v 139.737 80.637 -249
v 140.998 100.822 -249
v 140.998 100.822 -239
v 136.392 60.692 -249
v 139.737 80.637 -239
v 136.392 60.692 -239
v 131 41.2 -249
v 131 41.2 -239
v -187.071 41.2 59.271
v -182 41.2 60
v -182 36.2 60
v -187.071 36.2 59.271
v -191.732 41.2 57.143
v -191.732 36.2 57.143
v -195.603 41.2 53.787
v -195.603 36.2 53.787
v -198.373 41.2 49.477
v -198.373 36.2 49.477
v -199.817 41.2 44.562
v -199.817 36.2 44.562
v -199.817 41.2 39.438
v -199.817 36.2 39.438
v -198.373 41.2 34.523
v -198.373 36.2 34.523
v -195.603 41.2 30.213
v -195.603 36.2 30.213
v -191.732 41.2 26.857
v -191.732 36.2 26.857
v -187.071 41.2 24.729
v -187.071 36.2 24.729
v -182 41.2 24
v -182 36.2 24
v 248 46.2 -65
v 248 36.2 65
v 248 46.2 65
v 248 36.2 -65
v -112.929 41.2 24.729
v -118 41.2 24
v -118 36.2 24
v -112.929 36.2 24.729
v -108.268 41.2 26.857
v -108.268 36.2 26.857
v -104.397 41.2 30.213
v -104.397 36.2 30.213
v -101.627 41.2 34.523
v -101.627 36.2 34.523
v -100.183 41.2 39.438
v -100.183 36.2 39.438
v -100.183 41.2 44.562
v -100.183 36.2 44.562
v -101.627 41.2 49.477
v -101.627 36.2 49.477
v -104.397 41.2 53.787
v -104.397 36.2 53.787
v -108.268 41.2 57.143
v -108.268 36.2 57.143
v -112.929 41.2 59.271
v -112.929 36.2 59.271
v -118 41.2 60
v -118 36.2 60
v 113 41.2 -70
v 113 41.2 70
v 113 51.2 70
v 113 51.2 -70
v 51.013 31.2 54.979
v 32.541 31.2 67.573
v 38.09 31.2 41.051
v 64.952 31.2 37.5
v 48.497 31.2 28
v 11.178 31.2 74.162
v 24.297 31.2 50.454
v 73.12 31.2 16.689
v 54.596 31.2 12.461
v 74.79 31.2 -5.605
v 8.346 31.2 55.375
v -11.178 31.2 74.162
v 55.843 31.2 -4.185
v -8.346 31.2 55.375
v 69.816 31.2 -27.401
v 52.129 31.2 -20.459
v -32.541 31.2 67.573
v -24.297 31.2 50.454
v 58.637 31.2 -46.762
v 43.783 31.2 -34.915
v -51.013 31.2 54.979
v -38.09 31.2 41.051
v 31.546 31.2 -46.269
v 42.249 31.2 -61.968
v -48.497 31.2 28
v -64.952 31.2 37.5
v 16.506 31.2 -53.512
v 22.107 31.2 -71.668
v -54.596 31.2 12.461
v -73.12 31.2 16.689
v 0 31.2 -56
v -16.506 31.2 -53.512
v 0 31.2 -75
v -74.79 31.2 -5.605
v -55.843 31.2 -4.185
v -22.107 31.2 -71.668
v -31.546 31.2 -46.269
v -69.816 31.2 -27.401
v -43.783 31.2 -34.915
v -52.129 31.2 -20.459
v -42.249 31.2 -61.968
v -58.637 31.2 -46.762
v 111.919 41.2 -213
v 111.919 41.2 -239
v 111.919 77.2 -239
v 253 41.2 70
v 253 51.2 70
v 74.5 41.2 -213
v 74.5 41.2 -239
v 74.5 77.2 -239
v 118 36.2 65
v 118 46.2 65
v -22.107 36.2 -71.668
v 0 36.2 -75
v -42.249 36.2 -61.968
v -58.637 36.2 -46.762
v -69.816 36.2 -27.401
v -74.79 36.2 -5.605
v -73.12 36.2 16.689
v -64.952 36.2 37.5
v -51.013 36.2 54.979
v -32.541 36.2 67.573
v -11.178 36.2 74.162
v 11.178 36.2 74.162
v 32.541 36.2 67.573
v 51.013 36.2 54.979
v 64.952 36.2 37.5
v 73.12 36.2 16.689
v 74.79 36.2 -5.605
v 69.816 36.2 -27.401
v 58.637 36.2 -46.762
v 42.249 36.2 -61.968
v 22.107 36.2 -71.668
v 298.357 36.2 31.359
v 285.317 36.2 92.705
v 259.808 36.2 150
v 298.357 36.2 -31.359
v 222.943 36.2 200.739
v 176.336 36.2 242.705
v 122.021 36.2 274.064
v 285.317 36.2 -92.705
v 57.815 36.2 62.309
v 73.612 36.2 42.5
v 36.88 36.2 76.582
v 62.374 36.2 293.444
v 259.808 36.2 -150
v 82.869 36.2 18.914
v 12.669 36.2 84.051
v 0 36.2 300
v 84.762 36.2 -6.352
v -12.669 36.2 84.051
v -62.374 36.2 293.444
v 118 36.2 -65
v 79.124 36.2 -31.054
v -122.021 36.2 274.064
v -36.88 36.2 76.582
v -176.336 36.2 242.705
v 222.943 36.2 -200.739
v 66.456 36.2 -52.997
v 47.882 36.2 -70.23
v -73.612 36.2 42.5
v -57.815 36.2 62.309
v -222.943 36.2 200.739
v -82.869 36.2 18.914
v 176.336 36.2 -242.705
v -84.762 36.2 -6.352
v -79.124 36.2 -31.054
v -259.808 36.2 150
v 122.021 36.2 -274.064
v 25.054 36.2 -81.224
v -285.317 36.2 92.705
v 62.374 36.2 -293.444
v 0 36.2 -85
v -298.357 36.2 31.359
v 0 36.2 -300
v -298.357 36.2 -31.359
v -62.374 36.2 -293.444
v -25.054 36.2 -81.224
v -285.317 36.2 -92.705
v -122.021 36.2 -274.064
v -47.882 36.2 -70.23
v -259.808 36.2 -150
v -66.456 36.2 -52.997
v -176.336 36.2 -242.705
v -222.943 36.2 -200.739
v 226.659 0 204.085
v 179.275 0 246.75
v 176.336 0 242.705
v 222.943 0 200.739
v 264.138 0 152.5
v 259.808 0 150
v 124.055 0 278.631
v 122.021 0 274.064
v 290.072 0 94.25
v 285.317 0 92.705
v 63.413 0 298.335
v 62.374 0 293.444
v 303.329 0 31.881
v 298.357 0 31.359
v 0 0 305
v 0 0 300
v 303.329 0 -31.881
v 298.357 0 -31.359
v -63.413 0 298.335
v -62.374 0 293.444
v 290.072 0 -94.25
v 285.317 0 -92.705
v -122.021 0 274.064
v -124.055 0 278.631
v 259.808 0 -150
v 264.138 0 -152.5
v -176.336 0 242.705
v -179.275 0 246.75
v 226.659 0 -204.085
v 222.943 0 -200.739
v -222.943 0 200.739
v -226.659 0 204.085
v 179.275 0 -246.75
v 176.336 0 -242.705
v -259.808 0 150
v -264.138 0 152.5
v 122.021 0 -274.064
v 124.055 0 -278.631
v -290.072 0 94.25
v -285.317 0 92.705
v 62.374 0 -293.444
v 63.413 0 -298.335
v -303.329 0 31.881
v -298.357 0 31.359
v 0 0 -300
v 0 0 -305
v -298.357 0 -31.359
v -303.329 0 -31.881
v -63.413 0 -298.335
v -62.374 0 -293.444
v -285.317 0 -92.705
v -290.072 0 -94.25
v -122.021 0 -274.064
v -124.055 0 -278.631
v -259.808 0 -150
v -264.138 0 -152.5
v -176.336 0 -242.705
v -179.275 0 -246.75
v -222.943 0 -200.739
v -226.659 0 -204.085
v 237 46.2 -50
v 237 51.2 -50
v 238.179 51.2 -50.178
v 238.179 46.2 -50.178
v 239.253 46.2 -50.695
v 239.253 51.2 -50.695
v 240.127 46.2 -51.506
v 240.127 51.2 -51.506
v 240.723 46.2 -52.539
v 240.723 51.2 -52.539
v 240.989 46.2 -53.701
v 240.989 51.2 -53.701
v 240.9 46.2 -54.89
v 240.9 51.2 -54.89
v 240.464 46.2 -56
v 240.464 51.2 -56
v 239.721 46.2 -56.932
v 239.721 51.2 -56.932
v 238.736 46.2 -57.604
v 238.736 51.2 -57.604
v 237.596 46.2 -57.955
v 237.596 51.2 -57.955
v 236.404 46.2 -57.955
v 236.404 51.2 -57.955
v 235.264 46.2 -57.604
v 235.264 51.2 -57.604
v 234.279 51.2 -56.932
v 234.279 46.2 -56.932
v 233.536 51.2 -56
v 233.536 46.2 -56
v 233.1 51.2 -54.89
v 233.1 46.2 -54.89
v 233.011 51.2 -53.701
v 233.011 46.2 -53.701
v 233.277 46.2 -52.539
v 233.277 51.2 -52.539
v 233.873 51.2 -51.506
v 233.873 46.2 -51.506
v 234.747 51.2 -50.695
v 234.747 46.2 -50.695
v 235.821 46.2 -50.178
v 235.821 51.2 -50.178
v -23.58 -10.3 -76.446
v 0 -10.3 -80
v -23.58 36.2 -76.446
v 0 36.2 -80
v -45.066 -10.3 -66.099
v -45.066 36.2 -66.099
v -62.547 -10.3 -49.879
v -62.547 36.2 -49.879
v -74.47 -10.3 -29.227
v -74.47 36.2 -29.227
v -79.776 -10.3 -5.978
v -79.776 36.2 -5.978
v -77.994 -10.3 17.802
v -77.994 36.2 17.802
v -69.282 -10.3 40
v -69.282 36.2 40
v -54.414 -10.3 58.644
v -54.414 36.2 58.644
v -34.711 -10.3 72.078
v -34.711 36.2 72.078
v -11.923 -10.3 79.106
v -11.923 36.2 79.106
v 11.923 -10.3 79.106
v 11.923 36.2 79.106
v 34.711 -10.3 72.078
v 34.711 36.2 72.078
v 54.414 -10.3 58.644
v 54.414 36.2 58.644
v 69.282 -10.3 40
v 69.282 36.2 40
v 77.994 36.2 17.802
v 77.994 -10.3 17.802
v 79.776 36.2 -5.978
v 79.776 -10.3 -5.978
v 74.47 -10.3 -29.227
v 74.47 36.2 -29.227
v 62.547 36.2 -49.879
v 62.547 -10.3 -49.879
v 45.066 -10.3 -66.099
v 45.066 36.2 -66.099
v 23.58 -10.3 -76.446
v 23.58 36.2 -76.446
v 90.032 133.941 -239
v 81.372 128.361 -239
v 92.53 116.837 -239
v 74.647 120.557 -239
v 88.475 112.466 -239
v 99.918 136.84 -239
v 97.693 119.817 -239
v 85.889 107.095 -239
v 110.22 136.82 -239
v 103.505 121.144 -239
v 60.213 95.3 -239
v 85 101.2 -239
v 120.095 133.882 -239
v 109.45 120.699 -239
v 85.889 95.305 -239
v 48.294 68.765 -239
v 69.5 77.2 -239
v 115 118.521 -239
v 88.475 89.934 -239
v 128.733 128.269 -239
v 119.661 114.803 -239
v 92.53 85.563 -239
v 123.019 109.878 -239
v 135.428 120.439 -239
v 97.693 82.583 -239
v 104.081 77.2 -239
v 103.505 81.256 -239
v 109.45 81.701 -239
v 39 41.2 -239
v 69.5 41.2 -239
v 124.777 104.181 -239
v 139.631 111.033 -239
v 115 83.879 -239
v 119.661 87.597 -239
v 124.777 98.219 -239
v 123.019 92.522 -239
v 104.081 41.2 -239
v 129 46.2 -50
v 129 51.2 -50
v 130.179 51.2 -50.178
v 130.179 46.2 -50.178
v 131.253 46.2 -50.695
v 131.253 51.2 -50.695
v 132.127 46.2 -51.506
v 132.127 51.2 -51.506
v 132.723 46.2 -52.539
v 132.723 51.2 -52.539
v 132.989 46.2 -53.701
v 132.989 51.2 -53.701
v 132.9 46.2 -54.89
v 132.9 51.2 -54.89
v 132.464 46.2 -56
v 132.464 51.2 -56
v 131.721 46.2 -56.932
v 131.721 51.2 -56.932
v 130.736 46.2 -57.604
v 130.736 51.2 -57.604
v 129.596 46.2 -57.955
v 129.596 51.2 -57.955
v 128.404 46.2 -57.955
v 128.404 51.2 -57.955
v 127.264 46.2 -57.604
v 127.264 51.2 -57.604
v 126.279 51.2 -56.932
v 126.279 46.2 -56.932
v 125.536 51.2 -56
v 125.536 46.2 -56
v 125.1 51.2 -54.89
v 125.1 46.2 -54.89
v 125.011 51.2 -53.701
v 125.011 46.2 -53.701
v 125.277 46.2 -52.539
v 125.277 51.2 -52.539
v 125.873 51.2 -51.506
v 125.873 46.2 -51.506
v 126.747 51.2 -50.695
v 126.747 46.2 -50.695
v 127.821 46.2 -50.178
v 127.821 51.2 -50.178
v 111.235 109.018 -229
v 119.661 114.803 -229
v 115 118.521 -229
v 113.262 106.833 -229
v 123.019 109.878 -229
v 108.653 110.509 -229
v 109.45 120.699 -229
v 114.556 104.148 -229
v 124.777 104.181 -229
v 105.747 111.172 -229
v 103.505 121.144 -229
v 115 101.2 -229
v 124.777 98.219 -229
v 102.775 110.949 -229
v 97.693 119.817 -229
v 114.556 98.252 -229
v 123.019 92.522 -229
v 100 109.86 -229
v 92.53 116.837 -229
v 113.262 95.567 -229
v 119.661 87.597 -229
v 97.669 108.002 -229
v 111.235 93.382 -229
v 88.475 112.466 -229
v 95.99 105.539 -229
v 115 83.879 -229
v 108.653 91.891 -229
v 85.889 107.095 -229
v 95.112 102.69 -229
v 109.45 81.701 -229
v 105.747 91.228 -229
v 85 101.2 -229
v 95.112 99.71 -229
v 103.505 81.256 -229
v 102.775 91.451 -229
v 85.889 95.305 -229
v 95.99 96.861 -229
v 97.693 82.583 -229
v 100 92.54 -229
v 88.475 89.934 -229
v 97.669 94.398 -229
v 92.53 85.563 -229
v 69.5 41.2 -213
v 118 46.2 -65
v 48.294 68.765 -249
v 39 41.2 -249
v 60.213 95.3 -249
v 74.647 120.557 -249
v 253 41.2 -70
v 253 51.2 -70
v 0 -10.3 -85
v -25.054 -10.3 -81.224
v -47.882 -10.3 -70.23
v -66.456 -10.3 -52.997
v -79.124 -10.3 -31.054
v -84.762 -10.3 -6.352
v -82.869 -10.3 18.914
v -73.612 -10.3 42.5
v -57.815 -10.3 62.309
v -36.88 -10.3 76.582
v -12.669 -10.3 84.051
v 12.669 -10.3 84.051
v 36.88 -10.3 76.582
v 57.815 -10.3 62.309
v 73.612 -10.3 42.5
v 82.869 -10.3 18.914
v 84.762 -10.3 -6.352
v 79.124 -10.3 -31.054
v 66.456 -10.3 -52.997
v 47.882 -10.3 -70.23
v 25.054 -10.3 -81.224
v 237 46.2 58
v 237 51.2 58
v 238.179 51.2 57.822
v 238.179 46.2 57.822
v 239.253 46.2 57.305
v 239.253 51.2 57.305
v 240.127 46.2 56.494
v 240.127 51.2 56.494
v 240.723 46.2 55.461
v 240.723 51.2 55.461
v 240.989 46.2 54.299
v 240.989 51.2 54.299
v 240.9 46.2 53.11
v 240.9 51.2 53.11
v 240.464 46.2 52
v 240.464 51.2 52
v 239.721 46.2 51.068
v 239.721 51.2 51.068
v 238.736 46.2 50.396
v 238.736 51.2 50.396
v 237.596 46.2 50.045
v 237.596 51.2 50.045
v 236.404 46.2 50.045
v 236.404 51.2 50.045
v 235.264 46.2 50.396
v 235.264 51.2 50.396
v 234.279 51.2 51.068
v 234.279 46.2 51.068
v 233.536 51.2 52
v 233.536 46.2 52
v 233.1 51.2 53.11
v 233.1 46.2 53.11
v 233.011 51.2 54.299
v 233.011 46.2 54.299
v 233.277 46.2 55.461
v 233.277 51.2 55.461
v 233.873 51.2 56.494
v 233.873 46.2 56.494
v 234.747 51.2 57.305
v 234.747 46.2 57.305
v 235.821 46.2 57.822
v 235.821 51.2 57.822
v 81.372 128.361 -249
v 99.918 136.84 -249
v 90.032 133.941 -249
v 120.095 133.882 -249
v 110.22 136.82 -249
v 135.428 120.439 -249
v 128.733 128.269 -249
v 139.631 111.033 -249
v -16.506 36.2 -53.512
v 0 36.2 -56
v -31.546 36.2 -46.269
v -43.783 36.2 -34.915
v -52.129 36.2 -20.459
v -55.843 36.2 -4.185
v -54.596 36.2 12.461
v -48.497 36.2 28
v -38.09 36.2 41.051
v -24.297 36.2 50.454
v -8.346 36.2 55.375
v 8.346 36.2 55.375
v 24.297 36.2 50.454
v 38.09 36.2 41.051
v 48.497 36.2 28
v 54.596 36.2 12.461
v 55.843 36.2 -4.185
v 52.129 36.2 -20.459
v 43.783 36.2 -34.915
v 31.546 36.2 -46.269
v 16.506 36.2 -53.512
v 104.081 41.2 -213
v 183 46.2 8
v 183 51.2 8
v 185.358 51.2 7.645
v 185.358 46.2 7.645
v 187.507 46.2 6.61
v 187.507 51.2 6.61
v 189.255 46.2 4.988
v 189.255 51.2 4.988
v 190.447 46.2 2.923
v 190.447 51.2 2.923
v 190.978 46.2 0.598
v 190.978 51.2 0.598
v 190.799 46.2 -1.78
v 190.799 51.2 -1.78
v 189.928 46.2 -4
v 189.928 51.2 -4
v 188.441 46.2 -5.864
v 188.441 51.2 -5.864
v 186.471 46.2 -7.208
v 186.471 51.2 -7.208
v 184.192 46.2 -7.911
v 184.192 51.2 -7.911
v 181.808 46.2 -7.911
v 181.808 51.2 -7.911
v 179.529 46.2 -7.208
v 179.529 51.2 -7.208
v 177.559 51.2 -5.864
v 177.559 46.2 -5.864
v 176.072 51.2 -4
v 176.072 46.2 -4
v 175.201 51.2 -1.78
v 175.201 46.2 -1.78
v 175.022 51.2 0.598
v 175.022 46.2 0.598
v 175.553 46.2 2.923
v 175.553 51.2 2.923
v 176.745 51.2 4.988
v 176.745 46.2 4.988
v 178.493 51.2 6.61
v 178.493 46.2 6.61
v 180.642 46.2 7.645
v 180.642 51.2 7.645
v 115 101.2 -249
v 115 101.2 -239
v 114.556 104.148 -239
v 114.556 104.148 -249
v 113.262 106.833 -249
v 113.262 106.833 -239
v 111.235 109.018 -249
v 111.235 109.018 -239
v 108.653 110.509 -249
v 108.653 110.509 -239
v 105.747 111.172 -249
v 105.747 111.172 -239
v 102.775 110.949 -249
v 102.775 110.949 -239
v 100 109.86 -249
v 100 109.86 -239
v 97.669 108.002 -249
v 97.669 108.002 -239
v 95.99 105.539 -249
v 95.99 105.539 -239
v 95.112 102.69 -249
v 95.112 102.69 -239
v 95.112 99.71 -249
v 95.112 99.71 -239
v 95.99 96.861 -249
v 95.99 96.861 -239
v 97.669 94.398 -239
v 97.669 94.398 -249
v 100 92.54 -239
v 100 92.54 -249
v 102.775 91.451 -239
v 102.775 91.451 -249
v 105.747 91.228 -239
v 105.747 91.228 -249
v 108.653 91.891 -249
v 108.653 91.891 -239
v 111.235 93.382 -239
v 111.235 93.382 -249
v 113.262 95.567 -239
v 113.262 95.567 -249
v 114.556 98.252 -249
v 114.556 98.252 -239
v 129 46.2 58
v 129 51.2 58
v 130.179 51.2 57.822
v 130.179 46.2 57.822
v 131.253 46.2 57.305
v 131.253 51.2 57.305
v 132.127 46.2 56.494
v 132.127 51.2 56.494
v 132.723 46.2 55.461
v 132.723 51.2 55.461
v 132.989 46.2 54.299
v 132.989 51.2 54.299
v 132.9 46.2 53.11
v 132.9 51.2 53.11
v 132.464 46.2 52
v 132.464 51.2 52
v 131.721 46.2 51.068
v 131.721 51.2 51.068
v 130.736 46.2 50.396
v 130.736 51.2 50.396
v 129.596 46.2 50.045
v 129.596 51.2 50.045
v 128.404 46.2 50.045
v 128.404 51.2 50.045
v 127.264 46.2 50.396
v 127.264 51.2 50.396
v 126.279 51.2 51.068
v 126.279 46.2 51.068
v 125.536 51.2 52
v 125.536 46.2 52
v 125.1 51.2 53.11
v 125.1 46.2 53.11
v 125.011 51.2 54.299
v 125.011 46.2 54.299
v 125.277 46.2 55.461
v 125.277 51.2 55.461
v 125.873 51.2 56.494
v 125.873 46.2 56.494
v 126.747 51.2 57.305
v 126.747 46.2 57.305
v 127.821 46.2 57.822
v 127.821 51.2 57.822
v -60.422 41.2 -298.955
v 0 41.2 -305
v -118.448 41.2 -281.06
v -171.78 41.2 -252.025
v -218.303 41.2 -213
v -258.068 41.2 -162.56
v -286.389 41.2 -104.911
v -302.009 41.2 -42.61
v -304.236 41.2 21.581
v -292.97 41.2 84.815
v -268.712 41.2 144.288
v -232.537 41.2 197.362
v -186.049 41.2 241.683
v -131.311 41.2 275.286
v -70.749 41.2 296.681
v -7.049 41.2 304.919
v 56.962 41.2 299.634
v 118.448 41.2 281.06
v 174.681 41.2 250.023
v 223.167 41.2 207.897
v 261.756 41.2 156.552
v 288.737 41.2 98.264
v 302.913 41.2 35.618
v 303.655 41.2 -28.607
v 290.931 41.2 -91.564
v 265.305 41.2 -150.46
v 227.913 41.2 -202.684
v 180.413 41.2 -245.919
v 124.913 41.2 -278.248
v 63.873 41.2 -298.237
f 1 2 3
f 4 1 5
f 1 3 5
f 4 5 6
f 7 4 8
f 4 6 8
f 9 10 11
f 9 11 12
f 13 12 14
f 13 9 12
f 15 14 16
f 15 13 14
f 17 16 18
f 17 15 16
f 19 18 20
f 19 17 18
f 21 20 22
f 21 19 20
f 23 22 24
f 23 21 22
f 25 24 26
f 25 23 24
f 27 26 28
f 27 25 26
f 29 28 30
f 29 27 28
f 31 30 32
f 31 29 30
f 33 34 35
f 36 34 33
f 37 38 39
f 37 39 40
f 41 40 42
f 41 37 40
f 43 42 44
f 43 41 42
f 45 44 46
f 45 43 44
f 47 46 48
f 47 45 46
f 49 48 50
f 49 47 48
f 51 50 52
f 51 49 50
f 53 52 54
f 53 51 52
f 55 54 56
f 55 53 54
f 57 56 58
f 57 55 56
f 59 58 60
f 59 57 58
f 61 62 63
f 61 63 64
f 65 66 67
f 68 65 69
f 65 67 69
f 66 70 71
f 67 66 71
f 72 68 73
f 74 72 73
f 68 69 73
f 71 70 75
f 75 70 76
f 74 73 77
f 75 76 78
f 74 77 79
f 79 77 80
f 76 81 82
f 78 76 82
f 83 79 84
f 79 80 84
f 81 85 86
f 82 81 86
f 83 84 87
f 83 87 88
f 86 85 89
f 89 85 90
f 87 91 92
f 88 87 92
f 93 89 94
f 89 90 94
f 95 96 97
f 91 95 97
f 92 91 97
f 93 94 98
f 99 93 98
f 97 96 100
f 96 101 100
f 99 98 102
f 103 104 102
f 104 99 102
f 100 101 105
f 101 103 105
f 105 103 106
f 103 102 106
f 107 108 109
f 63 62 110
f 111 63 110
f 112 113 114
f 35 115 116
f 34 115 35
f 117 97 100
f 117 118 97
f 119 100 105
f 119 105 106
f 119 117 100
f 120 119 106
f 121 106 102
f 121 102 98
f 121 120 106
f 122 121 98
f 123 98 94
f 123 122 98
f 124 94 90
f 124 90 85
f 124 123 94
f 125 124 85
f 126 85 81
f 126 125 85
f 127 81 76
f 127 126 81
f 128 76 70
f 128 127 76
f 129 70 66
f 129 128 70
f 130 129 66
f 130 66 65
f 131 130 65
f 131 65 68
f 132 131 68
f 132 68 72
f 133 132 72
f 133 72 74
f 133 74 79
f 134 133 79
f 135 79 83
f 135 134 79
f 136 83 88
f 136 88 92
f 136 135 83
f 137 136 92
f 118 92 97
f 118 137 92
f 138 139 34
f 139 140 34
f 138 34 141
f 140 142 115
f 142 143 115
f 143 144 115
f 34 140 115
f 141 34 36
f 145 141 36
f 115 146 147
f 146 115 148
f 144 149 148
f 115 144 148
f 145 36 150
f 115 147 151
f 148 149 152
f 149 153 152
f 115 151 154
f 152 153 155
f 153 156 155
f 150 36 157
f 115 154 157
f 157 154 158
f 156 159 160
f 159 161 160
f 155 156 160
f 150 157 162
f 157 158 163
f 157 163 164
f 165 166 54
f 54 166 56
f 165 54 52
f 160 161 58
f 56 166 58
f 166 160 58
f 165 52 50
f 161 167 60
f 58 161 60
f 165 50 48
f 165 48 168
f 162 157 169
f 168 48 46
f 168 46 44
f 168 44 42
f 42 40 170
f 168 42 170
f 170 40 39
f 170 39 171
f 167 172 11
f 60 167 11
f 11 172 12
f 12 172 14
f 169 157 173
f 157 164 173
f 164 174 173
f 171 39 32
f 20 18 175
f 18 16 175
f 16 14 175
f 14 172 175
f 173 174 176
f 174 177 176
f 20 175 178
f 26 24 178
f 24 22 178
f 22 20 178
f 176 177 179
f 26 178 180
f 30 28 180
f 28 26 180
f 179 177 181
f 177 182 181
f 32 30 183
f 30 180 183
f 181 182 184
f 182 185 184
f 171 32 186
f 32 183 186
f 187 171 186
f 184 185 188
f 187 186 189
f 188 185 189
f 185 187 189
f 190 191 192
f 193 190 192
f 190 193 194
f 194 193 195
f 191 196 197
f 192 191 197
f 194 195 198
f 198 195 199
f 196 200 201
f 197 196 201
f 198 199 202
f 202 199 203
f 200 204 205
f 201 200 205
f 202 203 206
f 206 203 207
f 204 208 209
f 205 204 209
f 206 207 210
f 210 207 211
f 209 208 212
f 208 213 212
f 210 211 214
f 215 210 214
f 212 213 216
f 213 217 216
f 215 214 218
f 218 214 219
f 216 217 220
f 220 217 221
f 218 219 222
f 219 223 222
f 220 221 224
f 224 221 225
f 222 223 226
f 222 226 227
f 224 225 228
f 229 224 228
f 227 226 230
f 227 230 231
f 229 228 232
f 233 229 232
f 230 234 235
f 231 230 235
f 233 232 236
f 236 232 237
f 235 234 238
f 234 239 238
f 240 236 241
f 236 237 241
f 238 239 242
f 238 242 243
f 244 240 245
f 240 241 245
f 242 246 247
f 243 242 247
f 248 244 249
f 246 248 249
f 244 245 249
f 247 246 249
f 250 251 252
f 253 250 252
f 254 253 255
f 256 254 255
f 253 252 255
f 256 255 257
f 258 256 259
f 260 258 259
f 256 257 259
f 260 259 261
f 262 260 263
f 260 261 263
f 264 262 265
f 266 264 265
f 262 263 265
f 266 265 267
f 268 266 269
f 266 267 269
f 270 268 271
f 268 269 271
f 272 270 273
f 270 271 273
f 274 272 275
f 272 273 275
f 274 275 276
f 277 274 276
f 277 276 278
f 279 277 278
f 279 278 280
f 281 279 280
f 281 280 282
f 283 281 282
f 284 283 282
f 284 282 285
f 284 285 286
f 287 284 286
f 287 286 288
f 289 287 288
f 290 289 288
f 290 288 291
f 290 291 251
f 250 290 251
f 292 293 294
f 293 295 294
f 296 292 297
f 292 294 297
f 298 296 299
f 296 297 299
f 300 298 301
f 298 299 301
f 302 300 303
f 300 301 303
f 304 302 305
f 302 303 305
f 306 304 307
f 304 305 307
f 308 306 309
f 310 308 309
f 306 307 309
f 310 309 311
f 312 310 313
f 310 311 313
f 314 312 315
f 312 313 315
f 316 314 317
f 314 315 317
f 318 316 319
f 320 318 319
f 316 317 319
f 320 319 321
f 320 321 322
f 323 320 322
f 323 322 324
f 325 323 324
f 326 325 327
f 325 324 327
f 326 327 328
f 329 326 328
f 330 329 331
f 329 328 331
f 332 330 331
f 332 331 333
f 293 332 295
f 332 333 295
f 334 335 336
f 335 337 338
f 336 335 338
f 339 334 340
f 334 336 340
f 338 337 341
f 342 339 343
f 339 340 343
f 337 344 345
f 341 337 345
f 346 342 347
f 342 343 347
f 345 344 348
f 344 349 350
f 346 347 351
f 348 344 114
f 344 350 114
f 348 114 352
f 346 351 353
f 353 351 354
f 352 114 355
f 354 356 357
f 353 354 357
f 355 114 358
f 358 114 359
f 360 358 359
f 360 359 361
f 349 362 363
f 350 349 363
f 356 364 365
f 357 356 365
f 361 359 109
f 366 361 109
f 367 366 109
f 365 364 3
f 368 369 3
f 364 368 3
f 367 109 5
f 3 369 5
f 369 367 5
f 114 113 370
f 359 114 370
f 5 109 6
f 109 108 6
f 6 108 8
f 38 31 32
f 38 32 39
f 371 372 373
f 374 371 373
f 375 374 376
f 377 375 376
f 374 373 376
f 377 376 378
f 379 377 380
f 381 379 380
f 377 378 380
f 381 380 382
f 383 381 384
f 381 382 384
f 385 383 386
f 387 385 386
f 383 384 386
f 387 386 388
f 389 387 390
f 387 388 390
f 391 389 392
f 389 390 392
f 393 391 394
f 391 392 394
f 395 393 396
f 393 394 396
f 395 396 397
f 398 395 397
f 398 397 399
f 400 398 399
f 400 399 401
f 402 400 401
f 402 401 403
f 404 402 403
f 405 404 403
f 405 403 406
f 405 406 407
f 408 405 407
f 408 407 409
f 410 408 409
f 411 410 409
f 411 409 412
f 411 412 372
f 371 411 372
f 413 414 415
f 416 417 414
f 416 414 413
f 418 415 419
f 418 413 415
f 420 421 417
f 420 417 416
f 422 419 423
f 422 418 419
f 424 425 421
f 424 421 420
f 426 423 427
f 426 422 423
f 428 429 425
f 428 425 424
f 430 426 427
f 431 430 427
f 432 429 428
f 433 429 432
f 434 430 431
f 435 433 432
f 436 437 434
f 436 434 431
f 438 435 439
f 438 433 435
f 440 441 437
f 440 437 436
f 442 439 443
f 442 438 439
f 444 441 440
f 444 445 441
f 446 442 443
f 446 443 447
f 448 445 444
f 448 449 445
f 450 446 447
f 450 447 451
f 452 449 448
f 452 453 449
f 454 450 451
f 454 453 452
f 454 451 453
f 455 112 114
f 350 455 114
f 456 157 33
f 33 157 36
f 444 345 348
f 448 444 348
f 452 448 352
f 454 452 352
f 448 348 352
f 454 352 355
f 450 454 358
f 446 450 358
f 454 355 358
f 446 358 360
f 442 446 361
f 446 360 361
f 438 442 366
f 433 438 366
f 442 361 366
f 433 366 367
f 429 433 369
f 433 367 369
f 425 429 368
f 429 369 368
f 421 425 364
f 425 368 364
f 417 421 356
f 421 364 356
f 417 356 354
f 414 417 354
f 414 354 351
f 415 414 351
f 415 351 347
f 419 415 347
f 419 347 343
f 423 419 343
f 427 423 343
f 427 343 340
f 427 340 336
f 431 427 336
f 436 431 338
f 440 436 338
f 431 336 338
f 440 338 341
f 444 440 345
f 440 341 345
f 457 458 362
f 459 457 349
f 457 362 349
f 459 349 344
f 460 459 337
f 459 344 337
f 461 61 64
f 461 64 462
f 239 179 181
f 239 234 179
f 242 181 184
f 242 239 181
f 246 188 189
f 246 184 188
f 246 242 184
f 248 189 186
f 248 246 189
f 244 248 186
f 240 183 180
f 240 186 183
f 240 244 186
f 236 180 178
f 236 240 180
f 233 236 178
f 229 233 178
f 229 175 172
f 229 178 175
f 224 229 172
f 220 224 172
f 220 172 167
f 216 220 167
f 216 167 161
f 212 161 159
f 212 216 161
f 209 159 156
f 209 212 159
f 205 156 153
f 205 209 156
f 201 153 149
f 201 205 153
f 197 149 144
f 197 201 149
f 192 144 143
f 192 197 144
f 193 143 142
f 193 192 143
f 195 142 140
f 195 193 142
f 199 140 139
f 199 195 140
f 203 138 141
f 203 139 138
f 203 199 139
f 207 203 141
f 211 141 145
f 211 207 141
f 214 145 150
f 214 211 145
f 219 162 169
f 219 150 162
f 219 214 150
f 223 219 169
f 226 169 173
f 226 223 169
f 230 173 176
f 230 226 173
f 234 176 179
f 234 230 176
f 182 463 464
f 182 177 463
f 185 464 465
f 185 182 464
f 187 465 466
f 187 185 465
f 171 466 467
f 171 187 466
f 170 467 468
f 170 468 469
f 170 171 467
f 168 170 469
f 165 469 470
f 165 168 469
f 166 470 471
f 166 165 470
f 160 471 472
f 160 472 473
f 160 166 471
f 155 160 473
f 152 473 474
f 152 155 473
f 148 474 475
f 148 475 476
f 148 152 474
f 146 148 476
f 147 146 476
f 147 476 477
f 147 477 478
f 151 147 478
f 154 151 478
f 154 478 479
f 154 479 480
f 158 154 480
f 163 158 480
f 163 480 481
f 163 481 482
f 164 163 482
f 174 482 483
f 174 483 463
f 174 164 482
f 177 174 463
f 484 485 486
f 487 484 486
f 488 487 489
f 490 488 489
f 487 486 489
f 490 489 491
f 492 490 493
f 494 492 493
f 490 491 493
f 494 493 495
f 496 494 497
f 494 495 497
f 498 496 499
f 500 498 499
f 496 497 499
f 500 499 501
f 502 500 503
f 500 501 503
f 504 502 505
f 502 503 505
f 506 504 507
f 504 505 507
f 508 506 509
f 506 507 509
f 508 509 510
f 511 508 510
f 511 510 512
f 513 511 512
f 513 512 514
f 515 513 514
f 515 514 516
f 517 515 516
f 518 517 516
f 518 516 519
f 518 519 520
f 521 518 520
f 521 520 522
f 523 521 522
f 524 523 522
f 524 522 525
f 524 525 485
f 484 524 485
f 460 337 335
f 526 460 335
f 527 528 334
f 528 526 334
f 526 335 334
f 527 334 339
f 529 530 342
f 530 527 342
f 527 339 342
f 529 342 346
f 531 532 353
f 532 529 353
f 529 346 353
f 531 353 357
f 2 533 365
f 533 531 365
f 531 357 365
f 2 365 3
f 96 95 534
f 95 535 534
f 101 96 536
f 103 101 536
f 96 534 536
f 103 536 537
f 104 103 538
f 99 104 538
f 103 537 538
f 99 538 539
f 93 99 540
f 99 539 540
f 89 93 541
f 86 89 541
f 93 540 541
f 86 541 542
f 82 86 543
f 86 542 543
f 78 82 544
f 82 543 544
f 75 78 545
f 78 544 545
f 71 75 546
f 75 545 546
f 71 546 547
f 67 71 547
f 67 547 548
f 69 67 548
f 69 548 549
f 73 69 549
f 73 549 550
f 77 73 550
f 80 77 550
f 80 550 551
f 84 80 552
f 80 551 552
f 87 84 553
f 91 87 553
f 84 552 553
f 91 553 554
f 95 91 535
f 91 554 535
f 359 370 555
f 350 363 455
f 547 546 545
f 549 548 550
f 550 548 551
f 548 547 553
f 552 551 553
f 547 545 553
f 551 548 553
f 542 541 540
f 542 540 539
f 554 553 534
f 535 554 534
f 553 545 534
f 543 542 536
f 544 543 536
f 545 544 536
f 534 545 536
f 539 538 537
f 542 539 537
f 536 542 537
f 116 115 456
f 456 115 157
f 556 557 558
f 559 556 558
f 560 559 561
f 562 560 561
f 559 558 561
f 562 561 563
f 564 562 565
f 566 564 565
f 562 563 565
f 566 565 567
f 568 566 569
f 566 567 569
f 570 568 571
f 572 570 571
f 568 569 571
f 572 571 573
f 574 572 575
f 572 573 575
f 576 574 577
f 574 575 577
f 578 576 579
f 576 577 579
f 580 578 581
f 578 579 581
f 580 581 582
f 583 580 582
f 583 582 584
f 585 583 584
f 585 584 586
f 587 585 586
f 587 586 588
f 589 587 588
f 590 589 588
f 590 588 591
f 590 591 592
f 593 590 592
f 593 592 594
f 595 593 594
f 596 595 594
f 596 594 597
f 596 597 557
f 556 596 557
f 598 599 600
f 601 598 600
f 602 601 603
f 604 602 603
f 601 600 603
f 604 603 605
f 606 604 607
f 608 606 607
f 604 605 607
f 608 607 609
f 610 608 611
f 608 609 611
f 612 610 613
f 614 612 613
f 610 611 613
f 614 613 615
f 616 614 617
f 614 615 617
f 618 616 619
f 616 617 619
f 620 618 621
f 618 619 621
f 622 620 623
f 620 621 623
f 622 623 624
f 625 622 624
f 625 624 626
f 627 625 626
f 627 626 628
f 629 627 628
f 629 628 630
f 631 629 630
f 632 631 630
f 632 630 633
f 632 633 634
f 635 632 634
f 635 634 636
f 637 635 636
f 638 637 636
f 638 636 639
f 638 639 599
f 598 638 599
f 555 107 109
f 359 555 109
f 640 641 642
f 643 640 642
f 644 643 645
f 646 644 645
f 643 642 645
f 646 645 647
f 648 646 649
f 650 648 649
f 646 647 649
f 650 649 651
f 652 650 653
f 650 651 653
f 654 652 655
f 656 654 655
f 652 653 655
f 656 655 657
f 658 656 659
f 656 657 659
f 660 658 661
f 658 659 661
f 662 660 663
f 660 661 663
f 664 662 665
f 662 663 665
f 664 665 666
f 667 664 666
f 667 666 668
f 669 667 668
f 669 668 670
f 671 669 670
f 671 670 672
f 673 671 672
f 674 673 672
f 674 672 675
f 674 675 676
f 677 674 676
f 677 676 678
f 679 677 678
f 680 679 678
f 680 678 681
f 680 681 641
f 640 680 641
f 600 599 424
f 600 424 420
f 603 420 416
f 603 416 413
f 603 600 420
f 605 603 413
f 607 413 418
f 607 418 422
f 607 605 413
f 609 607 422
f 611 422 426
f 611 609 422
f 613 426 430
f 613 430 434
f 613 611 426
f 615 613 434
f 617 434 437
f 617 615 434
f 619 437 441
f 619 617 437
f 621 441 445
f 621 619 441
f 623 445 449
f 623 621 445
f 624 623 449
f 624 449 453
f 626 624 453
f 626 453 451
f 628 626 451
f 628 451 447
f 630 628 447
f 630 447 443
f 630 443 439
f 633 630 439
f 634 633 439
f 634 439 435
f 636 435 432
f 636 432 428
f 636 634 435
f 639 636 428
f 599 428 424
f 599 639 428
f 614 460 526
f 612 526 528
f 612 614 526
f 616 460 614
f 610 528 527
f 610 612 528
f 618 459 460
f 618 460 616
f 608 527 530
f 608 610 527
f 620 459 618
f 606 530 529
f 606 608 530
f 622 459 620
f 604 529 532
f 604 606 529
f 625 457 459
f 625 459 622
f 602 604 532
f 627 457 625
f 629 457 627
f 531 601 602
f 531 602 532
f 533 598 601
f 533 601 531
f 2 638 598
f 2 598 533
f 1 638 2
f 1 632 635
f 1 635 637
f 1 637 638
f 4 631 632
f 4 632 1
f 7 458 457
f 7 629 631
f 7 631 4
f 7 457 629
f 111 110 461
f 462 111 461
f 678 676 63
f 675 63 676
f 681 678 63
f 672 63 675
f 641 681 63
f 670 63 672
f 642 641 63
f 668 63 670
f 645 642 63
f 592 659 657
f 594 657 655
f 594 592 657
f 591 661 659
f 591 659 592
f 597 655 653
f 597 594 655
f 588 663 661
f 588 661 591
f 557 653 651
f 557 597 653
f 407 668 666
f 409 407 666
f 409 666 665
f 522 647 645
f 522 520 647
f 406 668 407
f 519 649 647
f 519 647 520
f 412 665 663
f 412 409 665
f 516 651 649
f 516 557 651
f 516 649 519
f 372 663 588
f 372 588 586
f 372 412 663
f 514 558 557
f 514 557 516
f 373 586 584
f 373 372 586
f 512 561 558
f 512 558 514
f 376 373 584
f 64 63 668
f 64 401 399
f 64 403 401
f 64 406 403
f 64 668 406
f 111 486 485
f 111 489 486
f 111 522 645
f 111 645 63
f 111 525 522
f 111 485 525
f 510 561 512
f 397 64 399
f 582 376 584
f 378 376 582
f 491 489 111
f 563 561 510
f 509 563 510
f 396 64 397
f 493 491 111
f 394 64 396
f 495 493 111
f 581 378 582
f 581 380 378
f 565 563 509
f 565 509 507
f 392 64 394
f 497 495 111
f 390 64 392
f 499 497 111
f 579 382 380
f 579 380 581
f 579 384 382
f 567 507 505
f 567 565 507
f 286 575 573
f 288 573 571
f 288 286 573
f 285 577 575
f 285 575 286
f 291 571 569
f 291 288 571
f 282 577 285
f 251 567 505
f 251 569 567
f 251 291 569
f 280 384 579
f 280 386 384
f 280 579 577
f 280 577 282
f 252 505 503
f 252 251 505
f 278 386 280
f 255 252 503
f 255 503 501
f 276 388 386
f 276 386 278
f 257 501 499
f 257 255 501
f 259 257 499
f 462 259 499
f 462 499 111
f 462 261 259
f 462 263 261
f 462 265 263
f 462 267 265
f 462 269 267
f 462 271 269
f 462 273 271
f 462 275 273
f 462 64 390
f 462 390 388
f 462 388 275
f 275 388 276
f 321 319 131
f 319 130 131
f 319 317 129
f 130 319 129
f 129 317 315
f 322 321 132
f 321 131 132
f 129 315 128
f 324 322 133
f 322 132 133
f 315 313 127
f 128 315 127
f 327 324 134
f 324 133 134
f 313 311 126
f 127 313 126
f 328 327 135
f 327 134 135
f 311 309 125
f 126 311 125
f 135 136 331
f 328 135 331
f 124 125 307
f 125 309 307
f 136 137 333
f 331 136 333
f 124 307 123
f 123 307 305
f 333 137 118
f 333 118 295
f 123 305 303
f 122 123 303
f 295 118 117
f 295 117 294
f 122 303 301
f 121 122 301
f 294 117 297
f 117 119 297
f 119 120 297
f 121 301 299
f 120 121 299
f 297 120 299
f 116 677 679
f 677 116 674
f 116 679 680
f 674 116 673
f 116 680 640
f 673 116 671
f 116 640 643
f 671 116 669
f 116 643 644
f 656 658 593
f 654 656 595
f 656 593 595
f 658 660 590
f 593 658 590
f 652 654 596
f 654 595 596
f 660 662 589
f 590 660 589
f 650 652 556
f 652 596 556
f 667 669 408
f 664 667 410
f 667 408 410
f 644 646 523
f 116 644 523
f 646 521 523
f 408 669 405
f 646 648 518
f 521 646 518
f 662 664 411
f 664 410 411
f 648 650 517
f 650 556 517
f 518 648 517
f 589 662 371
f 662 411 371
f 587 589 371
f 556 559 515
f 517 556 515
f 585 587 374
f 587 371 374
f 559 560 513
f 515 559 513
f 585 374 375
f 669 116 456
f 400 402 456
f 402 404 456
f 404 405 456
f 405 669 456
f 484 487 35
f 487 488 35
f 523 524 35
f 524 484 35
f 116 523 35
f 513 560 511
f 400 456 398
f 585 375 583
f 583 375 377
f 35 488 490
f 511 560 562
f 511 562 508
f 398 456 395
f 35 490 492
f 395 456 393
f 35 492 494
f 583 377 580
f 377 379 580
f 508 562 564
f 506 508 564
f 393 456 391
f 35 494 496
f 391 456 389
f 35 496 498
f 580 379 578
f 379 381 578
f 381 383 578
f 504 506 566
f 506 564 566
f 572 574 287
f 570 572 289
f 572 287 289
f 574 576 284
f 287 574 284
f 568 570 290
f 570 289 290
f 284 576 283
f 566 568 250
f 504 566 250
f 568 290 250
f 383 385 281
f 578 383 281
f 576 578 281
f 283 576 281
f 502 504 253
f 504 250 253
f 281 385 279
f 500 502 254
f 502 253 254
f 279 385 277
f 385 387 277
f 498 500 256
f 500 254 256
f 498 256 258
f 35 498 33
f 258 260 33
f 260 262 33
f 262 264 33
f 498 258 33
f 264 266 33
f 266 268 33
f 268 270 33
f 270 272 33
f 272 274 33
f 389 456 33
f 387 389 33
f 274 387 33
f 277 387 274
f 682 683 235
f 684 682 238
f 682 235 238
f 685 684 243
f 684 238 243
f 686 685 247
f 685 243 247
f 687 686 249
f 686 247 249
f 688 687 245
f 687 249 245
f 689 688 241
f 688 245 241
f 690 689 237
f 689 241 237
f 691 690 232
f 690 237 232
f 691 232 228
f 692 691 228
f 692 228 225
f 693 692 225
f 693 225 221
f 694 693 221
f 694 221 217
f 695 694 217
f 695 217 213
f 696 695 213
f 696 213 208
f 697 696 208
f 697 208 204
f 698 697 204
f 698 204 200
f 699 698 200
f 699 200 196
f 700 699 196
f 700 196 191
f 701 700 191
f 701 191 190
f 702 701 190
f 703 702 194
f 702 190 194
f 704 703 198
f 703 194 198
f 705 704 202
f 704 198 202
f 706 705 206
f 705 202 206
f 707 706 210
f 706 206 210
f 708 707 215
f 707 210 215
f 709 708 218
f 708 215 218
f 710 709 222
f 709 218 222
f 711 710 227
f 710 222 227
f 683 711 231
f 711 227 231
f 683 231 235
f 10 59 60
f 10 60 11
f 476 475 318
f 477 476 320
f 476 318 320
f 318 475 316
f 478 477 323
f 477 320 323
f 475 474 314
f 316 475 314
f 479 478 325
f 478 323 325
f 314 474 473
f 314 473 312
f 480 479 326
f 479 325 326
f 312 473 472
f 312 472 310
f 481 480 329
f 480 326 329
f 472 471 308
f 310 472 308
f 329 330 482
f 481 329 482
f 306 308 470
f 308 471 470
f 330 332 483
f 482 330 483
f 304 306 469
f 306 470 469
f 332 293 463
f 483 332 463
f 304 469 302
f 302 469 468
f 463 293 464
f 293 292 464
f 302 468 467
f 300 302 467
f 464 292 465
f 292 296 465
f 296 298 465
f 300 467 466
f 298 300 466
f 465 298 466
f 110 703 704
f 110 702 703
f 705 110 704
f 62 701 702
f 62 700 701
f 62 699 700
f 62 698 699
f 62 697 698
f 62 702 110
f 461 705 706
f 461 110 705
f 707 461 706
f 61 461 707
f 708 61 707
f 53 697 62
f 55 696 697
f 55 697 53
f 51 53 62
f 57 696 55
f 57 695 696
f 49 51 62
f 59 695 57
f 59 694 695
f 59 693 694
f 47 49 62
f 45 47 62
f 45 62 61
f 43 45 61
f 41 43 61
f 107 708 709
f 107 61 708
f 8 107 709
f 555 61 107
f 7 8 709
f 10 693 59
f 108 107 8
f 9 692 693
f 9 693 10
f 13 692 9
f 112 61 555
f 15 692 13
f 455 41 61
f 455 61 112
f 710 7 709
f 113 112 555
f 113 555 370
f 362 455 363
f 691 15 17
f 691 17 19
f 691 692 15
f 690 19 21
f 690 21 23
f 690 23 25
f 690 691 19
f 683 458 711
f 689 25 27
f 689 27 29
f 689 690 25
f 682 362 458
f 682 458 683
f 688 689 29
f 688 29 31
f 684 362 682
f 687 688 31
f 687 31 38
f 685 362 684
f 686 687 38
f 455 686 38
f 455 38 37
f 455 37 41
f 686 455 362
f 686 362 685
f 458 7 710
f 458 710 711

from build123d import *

# Parameters (mm, degrees)
SKETCH_1_R          = 305
EXTRUDE_1_DEPTH     = 41.2
SKETCH_2_W          = 140
SKETCH_2_H          = 140
EXTRUDE_2_DEPTH     = 10
SHELL_1_T           = -5
CUT_EXTRUDE_1_DEPTH = 434.298326791
SKETCH_4_W          = 120
SKETCH_4_H          = 10
EXTRUDE_3_DEPTH     = 150
CUT_EXTRUDE_3_DEPTH = 150
SKETCH_6_R          = 10
CUT_EXTRUDE_4_DEPTH = 150
SKETCH_7_R          = 20
SKETCH_7_R_2        = 10
EXTRUDE_4_DEPTH     = 10
SKETCH_8_W          = 5
SKETCH_8_H          = 36
SKETCH_8_W_2        = 7.838760884
EXTRUDE_5_DEPTH     = 26
CUT_EXTRUDE_5_DEPTH = 535.481627176
SKETCH_11_W         = 19
SKETCH_11_H         = 5
SKETCH_11_W_2       = 5
SKETCH_11_H_2       = 46.5
SKETCH_18_R         = 4
SKETCH_18_R_2       = 8
CUT_EXTRUDE_9_DEPTH = 440.824965185


with BuildPart() as part:
    # 草图1 → 凸台-拉伸1 (new body)
    with BuildSketch(Plane(origin=(0, 0, 0), x_dir=(1, 0, 0), z_dir=(0, 1, 0))):
        with Locations(Location((0, 0, 0), (0, 0, 90))):
            Circle(SKETCH_1_R)
    extrude(amount=EXTRUDE_1_DEPTH)

    # 草图2 → 凸台-拉伸2 (add)
    with BuildSketch(Plane(origin=(0, 41.2, 0), x_dir=(1, 0, 0), z_dir=(0, 1, 0))):
        with Locations((183, 0)):
            Rectangle(SKETCH_2_W, SKETCH_2_H)
    extrude(amount=EXTRUDE_2_DEPTH)

    # 抽壳1
    shell_1_openings = [part.faces().sort_by_distance(p)[0] for p in [
        (0, 0, 0),
    ]]
    offset(amount=SHELL_1_T, openings=shell_1_openings, kind=Kind.INTERSECTION)

    # 草图3 → 切除-拉伸1 (cut, through all)
    with BuildSketch(Plane(origin=(0, 41.2, 0), x_dir=(1, 0, 0), z_dir=(0, 1, 0))):
        with BuildLine():
            Line((-182, -24), (-118, -24))
            ThreePointArc((-118, -24), (-100, -42), (-118, -60))
            Line((-118, -60), (-182, -60))
            ThreePointArc((-182, -60), (-200, -42), (-182, -24))
        make_face()
    extrude(amount=-CUT_EXTRUDE_1_DEPTH, mode=Mode.SUBTRACT)

    # 草图4 → 凸台-拉伸3 (add)
    with BuildSketch(Plane(origin=(0, 41.2, 0), x_dir=(1, 0, 0), z_dir=(0, 1, 0))):
        with Locations((99, 244)):
            Rectangle(SKETCH_4_W, SKETCH_4_H)
    extrude(amount=EXTRUDE_3_DEPTH)

    # 草图5 → 切除-拉伸3 (cut)
    with BuildSketch(Plane.XY.offset(-239)):
        with BuildLine():
            Line((39, 191.2), (39, 41.2))
            ThreePointArc((39, 41.2), (53.931588882, 82.177347592), (74.646786984, 120.556716136))
            ThreePointArc((74.646786984, 120.556716136), (115.26317996, 135.706044936), (140.99801314, 100.821780537))
            ThreePointArc((140.99801314, 100.821780537), (138.32356193, 70.621084147), (131, 41.2))
            Line((131, 41.2), (159, 41.2))
            Line((159, 41.2), (159, 191.2))
            Line((159, 191.2), (39, 191.2))
        make_face()
    extrude(amount=-CUT_EXTRUDE_3_DEPTH, mode=Mode.SUBTRACT)

    # 草图6 → 切除-拉伸4 (cut)
    with BuildSketch(Plane.XY.offset(-239)):
        with Locations((105, 101.2)):
            Circle(SKETCH_6_R)
    extrude(amount=-CUT_EXTRUDE_4_DEPTH, mode=Mode.SUBTRACT)

    # 草图7 → 凸台-拉伸4 (add)
    with BuildSketch(Plane.XY.offset(-239)):
        with Locations(Location((105, 101.2, 0), (0, 0, 180))):
            Circle(SKETCH_7_R)
        with Locations((105, 101.2)):
            Circle(SKETCH_7_R_2, mode=Mode.SUBTRACT)
    extrude(amount=EXTRUDE_4_DEPTH)

    # 草图8 → 凸台-拉伸5 (add)
    with BuildSketch(Plane.XY.offset(-239)):
        with Locations((72, 59.2)):
            Rectangle(SKETCH_8_W, SKETCH_8_H)
        with Locations((108, 59.2)):
            Rectangle(SKETCH_8_W_2, SKETCH_8_H)
    extrude(amount=EXTRUDE_5_DEPTH)

    # 草图10 → 切除-拉伸5 (cut, through all)
    with BuildSketch(Plane(origin=(111.919380442, 0, 0), x_dir=(0, 0, -1), z_dir=(1, 0, 0))):
        Polygon((213, 41.2), (239, 77.2), (213, 77.2), align=None)
    extrude(amount=-CUT_EXTRUDE_5_DEPTH, mode=Mode.SUBTRACT)

    # 草图11 → 旋转1 (revolve)
    with BuildSketch(Plane.XY, mode=Mode.PRIVATE) as revolve_1_sk:
        with Locations((-65.5, 33.7)):
            Rectangle(SKETCH_11_W, SKETCH_11_H)
        with Locations((-82.5, 12.95)):
            Rectangle(SKETCH_11_W_2, SKETCH_11_H_2)
    revolve(revolve_1_sk.sketch.rotate(Axis((0, 0, 0), (0, 1, 0)), 270), axis=Axis((0, 0, 0), (0, 1, 0)))

    # 草图18 → 切除-拉伸9 (cut, through all)
    with BuildSketch(Plane(origin=(0, 51.2, 0), x_dir=(1, 0, 0), z_dir=(0, 1, 0))):
        with Locations(Location((237, 54, 0), (0, 0, 270))):
            Circle(SKETCH_18_R)
        with Locations(Location((237, -54, 0), (0, 0, 270))):
            Circle(SKETCH_18_R)
        with Locations(Location((129, -54, 0), (0, 0, 270))):
            Circle(SKETCH_18_R)
        with Locations(Location((129, 54, 0), (0, 0, 270))):
            Circle(SKETCH_18_R)
        with Locations(Location((183, 0, 0), (0, 0, 270))):
            Circle(SKETCH_18_R_2)
    extrude(amount=-CUT_EXTRUDE_9_DEPTH, mode=Mode.SUBTRACT)


solid = part.part
